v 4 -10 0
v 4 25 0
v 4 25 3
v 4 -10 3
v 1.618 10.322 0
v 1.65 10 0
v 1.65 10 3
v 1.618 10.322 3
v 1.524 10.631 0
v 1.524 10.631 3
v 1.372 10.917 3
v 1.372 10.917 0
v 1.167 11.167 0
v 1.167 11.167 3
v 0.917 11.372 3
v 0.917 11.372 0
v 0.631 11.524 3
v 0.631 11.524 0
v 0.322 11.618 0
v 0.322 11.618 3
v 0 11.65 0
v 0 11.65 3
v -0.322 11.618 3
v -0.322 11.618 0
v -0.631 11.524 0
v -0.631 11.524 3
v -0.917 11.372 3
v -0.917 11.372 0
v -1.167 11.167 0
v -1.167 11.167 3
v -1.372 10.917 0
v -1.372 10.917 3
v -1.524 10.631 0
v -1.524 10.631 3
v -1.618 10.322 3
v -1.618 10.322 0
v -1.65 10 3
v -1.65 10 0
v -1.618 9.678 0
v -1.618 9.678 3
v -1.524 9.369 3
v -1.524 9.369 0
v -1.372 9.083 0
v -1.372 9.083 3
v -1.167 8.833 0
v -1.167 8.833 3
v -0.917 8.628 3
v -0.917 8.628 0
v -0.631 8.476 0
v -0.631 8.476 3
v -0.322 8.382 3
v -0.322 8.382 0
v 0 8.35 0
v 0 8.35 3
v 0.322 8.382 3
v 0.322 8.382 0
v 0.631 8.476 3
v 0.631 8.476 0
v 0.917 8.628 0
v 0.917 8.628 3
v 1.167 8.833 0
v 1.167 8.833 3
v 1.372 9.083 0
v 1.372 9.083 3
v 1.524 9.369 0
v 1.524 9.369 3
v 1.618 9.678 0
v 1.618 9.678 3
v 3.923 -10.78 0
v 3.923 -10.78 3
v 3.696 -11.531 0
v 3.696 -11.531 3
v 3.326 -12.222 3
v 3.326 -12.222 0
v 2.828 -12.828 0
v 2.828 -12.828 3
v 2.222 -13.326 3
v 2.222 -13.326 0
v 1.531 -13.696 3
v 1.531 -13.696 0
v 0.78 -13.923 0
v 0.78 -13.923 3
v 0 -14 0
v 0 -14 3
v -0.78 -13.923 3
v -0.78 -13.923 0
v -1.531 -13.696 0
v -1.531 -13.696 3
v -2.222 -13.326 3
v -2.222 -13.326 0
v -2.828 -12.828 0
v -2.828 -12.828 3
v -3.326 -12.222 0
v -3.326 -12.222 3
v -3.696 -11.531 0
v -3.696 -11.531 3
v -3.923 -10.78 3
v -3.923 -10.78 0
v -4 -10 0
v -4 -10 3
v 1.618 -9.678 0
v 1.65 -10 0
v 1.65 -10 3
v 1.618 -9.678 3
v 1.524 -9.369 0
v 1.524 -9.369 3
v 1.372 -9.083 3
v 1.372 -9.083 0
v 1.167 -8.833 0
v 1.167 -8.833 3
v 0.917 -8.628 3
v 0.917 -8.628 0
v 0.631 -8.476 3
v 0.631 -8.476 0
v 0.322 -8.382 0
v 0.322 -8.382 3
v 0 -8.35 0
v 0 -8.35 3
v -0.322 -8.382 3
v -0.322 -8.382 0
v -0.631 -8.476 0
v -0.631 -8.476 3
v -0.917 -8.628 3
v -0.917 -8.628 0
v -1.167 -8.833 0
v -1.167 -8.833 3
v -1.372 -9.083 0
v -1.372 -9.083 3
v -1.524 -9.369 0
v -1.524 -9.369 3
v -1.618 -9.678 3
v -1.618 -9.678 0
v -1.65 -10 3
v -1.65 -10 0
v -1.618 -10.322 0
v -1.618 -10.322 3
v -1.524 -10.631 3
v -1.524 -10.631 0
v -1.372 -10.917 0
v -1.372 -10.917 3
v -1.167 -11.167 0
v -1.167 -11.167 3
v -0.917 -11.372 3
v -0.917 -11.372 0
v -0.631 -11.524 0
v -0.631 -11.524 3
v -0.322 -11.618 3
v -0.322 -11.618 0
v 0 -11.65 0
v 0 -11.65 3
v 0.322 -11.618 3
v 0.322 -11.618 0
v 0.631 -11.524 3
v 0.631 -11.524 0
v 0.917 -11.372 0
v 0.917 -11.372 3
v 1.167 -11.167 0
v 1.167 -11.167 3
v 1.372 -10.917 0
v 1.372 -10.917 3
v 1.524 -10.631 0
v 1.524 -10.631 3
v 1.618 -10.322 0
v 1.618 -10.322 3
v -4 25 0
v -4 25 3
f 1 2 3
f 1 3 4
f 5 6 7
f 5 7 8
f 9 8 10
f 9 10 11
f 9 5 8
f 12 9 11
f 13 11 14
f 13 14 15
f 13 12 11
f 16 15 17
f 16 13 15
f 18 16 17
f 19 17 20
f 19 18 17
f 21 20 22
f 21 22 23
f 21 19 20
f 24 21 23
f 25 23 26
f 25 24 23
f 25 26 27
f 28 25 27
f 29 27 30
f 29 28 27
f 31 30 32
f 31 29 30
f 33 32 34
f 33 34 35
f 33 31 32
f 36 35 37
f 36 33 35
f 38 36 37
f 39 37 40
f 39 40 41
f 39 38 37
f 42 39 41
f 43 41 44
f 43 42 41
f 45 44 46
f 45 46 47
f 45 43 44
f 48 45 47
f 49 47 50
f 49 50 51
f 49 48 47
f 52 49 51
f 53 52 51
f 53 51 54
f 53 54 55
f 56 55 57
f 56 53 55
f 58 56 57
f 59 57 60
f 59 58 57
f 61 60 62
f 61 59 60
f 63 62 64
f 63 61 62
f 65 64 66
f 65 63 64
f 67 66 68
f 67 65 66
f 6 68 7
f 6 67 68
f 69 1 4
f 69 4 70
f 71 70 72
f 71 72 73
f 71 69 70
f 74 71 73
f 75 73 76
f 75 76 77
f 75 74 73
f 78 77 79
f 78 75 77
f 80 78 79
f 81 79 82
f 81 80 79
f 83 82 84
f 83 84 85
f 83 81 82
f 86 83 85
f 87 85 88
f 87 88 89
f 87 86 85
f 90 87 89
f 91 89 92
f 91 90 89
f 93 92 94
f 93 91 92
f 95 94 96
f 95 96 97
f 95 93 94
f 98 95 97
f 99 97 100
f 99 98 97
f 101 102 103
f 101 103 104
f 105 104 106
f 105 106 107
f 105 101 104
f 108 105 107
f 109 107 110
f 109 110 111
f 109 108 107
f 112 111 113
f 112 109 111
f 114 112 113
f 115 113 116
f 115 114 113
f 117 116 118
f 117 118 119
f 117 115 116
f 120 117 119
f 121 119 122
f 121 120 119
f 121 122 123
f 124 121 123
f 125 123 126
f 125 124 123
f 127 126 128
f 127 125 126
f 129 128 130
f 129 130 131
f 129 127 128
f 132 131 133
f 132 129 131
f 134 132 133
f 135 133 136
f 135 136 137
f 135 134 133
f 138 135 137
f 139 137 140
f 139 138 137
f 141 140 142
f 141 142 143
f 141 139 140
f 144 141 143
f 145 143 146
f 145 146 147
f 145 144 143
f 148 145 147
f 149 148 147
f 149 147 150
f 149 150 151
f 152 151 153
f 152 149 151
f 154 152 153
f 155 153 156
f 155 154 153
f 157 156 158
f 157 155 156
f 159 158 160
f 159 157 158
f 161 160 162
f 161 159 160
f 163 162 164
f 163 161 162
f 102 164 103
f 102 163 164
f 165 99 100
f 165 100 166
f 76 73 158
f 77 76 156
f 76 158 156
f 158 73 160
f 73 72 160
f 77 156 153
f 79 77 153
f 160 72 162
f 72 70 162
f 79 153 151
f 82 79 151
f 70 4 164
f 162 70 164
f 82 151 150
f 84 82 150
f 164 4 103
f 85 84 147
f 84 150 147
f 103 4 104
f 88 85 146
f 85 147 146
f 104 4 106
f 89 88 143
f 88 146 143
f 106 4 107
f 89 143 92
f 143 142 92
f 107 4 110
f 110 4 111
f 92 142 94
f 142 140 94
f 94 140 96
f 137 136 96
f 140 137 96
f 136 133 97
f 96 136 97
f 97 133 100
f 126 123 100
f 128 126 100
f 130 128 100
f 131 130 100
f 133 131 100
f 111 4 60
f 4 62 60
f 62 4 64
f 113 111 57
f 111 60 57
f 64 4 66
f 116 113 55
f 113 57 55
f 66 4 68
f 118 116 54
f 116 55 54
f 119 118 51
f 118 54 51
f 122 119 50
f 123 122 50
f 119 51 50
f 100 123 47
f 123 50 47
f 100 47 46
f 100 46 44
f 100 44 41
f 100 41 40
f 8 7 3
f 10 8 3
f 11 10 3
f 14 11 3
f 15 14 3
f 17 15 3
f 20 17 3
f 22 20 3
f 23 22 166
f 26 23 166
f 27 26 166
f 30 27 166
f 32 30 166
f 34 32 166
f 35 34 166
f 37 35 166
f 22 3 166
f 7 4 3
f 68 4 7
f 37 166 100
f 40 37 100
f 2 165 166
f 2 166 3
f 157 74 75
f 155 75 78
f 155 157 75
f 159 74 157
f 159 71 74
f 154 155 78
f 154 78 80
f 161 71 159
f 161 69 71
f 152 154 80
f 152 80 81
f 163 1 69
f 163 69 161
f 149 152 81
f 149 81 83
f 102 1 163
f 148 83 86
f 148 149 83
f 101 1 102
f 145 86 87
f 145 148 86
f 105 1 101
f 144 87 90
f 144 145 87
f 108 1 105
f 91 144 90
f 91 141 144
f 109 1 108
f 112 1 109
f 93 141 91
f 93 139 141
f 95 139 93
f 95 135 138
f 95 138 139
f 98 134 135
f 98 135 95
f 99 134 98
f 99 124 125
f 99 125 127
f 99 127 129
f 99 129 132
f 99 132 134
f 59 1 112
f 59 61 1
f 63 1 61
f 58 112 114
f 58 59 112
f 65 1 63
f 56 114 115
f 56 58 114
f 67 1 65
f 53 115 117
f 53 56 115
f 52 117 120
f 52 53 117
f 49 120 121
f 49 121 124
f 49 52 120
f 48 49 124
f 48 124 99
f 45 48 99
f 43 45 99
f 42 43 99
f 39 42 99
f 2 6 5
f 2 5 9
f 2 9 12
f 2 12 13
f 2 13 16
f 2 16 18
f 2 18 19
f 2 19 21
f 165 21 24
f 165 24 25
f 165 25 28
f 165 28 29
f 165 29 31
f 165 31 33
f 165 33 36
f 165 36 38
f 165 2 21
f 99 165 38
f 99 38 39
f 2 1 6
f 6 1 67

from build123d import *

# Parameters (mm, degrees)
SKETCH_1_R      = 1.65
EXTRUDE_1_DEPTH = 3
EXTRUDE_START   = -3
EXTRUDE_2_DEPTH = 3


with BuildPart() as part:
    # 草图1 → 凸台-拉伸1 (new body)
    with BuildSketch(Plane.XY):
        with BuildLine():
            Line((4, 10), (4, -10))
            ThreePointArc((4, -10), (0, -14), (-4, -10))
            Line((-4, -10), (-4, 10))
            ThreePointArc((-4, 10), (0, 14), (4, 10))
        make_face()
        with Locations((0, 10)):
            Circle(SKETCH_1_R, mode=Mode.SUBTRACT)
        with Locations((0, -10)):
            Circle(SKETCH_1_R, mode=Mode.SUBTRACT)
    extrude(amount=EXTRUDE_1_DEPTH)

    # 草图2 → 凸台-拉伸2 (add)
    with BuildSketch(Plane.XY.offset(3).offset(EXTRUDE_START)):
        with BuildLine():
            Line((-4, 10), (-4, 25))
            Line((-4, 25), (4, 25))
            Line((4, 25), (4, 10))
            ThreePointArc((4, 10), (0, 14), (-4, 10))
        make_face()
    extrude(amount=EXTRUDE_2_DEPTH)


solid = part.part
